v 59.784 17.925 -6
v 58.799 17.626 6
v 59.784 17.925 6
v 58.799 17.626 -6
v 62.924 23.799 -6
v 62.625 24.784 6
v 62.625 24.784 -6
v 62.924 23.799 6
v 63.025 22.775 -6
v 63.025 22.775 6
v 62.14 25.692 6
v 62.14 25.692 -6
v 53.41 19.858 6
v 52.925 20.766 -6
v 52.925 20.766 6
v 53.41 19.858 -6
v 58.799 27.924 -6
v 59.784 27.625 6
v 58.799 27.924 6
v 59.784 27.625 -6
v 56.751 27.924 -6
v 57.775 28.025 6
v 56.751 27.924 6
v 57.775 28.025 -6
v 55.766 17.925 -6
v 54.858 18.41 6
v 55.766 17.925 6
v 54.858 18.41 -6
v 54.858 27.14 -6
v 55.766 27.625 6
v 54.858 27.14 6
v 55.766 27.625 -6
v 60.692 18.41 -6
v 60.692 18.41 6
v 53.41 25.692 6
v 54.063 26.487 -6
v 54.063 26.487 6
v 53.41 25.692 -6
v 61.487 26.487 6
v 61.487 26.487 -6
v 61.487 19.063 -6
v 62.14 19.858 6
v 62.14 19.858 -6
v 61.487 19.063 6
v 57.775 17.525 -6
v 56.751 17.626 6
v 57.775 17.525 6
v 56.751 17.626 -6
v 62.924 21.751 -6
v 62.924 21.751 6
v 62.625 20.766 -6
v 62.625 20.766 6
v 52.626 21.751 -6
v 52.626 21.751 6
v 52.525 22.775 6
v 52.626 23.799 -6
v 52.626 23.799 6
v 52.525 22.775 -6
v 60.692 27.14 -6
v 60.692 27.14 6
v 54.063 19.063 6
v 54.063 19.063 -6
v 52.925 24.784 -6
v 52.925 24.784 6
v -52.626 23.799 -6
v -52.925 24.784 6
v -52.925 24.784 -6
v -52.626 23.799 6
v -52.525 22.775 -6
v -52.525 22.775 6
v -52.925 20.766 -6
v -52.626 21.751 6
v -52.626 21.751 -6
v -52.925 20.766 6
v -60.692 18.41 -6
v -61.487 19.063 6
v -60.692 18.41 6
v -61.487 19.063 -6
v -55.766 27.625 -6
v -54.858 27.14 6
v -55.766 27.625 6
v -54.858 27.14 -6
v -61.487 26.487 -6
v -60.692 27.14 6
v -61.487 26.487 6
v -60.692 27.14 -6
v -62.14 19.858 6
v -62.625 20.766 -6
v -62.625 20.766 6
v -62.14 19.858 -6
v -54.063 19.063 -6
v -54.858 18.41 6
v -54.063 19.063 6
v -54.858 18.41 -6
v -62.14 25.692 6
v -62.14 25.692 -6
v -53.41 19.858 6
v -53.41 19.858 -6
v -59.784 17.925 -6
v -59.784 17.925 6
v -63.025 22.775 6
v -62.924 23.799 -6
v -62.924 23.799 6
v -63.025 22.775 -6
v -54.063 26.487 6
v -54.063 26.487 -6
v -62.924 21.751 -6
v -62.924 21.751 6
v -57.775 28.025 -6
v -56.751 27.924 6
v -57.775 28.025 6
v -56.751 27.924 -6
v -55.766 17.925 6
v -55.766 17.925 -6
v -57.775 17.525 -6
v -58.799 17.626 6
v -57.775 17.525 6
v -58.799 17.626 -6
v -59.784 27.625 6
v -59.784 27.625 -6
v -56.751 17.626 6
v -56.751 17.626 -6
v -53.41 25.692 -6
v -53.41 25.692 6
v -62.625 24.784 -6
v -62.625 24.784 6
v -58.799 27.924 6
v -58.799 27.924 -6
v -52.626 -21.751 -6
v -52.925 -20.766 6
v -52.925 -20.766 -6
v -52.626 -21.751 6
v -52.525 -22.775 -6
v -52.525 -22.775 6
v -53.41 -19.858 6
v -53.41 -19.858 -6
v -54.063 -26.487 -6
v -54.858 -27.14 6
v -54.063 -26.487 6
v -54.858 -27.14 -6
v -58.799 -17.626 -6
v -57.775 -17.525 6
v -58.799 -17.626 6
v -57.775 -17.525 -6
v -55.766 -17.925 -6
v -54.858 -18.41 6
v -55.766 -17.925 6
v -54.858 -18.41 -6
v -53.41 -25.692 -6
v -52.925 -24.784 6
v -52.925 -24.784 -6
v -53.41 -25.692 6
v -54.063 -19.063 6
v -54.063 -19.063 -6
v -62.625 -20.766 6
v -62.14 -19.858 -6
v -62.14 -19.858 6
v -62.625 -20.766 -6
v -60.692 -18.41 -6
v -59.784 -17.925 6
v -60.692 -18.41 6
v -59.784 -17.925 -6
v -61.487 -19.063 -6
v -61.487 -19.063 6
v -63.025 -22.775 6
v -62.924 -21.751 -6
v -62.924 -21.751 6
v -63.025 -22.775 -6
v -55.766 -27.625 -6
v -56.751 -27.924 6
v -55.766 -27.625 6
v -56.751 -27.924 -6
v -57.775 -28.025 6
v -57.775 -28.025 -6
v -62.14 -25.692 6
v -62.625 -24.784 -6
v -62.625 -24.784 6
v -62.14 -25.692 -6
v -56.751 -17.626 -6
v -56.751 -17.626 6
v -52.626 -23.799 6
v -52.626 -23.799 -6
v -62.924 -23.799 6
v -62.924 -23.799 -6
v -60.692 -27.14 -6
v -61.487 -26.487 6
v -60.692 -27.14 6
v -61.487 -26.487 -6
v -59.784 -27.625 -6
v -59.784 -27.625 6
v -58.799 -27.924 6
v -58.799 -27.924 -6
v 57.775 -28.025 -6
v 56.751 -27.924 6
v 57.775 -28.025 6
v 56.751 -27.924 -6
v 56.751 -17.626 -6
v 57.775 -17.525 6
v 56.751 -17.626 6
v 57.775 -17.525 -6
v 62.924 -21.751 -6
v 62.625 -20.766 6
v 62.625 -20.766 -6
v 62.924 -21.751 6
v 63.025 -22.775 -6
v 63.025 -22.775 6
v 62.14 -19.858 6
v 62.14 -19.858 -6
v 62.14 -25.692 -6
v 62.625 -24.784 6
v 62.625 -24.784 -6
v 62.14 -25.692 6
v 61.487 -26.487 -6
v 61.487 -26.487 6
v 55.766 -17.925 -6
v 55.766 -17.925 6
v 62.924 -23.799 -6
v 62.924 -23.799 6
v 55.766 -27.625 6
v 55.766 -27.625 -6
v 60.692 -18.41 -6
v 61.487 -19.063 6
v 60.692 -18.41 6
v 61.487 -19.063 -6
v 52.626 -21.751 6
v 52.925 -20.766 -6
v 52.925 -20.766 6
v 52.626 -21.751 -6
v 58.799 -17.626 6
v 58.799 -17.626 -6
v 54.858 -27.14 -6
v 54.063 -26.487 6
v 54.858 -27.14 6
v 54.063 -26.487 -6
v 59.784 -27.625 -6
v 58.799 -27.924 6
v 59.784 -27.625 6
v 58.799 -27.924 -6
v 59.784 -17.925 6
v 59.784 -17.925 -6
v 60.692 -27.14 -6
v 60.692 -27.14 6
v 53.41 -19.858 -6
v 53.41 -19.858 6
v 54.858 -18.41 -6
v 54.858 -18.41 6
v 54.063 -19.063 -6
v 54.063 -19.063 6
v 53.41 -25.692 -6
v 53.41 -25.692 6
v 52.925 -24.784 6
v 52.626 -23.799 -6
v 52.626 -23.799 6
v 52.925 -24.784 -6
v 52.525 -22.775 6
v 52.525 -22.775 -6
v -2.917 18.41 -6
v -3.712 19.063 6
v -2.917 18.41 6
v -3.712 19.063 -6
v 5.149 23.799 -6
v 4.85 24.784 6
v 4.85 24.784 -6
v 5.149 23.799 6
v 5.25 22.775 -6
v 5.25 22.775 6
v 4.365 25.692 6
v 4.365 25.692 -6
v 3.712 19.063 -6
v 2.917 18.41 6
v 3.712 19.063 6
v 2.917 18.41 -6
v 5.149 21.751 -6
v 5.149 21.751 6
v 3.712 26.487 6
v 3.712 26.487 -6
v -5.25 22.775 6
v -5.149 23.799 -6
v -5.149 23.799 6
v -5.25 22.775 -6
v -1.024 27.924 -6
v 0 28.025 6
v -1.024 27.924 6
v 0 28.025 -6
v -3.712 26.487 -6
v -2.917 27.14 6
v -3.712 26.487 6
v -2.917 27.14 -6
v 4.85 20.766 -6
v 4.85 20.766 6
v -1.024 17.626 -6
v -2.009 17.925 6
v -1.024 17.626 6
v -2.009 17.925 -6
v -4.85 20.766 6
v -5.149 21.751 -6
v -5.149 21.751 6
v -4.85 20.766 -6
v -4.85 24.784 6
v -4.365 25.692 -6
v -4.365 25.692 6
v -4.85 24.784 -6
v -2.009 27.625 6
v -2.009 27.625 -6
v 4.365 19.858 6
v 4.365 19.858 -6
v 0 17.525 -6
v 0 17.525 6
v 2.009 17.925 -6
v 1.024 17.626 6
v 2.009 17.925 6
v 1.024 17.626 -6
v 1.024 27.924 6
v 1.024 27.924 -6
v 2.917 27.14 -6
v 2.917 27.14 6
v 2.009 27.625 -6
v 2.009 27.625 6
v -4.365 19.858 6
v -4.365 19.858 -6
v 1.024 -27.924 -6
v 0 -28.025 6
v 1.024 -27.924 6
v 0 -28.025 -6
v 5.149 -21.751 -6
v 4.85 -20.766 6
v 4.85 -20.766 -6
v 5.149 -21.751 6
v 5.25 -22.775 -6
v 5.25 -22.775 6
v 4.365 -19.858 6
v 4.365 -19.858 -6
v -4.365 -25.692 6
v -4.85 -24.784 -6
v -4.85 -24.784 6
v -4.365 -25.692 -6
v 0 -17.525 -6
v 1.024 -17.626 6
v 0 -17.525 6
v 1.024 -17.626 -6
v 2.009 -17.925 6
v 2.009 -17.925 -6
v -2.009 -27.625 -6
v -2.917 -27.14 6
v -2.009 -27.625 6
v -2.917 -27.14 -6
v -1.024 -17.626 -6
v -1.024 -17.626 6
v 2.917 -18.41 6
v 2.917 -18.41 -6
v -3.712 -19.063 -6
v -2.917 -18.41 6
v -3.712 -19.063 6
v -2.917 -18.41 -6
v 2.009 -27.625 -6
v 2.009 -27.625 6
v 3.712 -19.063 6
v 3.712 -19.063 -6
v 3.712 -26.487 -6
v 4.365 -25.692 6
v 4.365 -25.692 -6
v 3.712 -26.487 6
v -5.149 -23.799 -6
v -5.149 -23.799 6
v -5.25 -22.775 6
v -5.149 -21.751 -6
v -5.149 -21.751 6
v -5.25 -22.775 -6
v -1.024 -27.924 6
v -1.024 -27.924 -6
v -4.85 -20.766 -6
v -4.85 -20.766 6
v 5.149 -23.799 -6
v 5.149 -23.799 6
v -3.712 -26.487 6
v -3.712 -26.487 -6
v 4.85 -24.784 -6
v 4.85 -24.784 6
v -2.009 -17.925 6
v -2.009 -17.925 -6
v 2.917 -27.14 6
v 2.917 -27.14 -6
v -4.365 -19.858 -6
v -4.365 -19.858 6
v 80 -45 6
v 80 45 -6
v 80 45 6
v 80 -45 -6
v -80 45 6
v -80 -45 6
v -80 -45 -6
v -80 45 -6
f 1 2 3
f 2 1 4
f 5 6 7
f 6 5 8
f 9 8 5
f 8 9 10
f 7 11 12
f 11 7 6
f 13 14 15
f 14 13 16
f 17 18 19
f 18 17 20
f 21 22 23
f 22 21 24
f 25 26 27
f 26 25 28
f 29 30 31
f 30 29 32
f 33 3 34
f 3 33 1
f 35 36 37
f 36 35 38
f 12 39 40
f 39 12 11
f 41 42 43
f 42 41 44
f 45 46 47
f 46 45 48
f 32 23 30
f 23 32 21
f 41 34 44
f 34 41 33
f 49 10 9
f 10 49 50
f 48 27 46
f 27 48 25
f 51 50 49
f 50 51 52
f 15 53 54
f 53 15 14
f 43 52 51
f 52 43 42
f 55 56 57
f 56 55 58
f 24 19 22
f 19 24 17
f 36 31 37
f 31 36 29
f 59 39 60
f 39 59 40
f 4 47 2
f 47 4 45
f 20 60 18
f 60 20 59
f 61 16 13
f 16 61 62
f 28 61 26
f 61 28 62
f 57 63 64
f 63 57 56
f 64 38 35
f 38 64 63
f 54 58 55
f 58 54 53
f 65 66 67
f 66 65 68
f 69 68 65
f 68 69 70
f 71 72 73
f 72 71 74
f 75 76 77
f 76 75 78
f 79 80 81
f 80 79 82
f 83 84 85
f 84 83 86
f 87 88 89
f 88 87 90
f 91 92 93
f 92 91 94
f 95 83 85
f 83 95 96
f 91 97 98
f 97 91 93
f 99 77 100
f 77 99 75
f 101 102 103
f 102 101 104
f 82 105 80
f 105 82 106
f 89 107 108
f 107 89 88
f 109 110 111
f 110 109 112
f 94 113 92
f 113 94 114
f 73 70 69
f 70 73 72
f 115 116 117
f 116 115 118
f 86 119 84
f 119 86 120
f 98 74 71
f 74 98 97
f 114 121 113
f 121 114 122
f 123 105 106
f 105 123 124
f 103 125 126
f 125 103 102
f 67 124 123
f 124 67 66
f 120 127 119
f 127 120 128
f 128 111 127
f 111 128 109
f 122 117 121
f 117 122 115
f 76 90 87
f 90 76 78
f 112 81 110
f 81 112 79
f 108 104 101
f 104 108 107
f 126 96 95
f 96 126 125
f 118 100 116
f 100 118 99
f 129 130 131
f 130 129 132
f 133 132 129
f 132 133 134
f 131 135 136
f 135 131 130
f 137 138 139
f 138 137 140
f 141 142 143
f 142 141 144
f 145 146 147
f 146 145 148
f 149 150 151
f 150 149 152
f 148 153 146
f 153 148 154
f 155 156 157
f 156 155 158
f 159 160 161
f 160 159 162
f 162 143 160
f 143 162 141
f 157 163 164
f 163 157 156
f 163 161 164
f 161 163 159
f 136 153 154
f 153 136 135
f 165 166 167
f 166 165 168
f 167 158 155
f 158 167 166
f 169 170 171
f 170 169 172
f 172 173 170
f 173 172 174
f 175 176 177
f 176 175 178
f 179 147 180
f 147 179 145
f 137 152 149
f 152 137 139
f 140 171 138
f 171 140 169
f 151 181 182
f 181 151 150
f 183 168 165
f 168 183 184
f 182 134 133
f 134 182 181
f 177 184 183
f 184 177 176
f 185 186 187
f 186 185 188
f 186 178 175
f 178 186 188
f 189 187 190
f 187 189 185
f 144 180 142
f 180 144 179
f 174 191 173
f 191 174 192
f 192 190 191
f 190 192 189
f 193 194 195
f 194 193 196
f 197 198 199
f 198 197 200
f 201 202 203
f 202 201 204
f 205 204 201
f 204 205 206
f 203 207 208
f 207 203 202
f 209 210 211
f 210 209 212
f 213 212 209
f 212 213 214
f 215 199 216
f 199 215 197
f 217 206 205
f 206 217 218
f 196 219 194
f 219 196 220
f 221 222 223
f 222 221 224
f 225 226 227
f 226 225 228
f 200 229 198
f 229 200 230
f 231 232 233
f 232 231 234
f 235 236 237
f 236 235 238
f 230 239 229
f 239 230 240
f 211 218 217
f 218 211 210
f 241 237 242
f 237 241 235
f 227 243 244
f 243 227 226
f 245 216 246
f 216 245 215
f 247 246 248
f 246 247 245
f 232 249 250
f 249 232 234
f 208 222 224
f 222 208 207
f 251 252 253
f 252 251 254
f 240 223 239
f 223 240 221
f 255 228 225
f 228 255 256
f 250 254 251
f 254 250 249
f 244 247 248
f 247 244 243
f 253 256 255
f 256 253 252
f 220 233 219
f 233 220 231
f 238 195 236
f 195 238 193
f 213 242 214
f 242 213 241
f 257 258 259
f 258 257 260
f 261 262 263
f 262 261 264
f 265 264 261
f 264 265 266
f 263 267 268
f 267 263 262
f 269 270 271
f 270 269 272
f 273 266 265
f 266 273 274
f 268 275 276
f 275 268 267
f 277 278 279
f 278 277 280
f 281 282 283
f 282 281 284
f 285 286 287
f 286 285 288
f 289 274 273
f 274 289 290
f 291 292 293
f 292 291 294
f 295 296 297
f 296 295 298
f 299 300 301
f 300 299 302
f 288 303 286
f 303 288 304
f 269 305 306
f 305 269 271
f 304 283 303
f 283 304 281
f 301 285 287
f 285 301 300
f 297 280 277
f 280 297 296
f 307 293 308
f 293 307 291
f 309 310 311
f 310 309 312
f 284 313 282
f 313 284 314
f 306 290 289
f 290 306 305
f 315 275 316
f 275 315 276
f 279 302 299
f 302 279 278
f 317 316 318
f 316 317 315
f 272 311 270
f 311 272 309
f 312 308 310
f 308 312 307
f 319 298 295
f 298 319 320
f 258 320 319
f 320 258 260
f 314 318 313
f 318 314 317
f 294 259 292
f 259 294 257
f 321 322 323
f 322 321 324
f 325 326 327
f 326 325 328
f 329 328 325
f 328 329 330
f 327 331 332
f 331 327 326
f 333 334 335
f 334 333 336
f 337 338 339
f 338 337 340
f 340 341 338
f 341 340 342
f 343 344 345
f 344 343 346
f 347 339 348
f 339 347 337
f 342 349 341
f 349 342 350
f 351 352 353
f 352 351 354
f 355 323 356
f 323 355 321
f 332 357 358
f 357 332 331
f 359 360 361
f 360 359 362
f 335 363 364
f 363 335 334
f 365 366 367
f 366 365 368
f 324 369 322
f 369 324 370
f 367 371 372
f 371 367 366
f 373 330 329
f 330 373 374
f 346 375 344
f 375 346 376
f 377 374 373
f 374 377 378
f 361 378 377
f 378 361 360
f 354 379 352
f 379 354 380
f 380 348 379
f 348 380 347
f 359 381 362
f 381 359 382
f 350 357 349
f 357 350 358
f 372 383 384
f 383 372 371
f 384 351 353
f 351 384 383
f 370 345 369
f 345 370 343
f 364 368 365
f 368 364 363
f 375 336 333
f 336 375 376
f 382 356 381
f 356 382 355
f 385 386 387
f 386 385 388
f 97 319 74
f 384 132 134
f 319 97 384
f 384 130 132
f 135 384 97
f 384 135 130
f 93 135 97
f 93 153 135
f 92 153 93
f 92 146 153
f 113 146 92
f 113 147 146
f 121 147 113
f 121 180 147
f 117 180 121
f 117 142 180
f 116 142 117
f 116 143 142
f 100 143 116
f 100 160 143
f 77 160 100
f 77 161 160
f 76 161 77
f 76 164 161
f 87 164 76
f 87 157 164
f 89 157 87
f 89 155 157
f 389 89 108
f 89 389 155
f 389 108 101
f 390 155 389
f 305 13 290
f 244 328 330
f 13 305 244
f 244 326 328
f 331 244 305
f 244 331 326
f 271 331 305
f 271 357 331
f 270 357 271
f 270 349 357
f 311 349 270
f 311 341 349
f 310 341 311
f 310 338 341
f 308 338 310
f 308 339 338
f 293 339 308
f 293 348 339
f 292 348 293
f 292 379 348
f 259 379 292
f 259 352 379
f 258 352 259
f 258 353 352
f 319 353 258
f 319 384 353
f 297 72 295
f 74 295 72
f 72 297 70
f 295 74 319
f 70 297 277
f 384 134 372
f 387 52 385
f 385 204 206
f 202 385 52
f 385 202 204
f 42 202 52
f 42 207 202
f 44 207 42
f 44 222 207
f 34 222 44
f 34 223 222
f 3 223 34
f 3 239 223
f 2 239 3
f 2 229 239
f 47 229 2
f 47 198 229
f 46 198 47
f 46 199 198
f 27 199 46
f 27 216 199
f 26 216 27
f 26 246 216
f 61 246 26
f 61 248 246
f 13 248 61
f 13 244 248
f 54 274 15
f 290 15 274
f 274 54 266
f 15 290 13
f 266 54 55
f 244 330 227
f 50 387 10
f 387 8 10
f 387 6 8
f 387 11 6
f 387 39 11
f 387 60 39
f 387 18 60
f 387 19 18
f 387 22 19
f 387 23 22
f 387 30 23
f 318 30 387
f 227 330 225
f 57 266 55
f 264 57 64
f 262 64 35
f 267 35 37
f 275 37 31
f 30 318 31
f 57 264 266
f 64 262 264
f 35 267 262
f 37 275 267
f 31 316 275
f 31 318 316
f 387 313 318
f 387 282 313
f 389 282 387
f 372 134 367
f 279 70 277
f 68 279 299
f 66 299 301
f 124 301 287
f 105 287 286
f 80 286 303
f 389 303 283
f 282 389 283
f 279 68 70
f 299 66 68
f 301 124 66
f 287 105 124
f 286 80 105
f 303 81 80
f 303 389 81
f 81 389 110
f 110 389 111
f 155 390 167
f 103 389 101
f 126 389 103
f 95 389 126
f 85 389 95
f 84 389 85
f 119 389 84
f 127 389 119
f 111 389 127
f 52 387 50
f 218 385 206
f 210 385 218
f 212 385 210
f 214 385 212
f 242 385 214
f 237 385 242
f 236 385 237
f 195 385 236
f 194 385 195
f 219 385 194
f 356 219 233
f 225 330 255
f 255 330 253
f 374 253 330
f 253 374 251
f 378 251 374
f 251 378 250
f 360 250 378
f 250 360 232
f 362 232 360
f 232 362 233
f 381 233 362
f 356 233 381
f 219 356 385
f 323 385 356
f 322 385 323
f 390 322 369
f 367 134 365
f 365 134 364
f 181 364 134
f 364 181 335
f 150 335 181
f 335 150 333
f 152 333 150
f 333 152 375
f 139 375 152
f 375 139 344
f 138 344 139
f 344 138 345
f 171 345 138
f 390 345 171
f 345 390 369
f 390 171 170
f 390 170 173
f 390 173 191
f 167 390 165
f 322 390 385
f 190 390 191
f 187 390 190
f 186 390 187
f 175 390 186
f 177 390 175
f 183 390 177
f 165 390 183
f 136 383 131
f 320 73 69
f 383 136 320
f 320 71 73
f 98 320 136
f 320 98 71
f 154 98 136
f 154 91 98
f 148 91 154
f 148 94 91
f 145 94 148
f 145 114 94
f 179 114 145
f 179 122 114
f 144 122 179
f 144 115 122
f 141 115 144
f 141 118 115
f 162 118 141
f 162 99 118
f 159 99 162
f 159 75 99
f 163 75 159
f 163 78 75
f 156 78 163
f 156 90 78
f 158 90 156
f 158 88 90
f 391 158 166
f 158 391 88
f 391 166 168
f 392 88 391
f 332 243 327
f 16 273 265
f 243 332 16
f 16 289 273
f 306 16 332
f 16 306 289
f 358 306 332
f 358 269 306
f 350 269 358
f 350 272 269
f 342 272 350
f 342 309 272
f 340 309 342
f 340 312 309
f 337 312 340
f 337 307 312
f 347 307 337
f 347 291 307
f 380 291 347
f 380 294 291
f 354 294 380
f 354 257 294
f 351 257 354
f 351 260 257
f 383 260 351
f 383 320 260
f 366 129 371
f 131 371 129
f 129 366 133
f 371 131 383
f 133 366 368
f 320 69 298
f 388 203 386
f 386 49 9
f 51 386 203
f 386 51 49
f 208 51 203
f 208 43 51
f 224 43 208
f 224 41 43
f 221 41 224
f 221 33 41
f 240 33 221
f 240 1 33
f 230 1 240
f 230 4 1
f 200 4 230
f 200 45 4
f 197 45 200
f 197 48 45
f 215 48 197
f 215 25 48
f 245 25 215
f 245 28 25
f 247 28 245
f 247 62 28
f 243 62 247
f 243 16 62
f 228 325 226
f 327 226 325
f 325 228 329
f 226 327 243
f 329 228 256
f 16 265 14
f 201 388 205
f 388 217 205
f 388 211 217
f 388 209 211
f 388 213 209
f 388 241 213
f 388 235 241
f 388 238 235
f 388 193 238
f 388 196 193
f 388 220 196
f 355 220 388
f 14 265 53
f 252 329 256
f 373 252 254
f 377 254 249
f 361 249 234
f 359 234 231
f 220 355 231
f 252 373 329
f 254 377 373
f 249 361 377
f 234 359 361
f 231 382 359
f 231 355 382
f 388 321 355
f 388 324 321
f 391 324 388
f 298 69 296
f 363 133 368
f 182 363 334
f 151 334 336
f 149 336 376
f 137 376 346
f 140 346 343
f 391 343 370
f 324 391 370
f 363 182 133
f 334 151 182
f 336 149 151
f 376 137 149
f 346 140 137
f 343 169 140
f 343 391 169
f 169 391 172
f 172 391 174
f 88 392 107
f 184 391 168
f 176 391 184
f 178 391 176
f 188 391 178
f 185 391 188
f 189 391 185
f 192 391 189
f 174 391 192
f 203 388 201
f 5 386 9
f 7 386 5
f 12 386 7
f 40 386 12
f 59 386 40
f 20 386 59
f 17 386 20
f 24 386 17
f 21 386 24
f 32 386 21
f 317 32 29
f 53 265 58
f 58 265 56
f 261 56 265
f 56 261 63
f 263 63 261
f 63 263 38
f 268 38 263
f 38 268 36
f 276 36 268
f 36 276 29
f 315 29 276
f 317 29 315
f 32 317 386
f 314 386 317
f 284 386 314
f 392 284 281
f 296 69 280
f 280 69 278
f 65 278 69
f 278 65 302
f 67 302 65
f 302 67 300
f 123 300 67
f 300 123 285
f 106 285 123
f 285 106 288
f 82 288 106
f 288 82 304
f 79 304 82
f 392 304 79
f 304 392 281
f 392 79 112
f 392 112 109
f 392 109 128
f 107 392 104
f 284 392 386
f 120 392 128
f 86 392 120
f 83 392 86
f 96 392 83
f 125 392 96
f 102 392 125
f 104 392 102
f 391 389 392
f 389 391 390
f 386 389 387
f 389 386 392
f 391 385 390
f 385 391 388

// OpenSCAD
$fn = 32;

// ----------------------------------------------------------------------
// Corner plate 160 x 90 x 12
// 6 holes, centres taken from the edge offset
// ----------------------------------------------------------------------

// --- parameters (mm) ---
plate = [160, 90, 12];  // overall size (x, y, z)
holes = 6;              // number of holes the drawing asks for
hole_d = 10.5;          // hole diameter
edge = 22.225;          // hole centre offset from the plate edge

// --- derived feature positions (mm) ---
corner_x = plate[0] / 2 - edge;  // = 57.77   corner hole X
corner_y = plate[1] / 2 - edge;  // = 22.77   corner hole Y
feature_centers = [
  [corner_x, corner_y],
  [-corner_x, corner_y],
  [-corner_x, -corner_y],
  [corner_x, -corner_y],
  [0, corner_y],
  [0, -corner_y]
];   // hole centres the loop below drills

// plate outline, every hole drilled through with the same cutters
difference() {
  cube(plate, center = true);
  for (centre = feature_centers)
    translate([centre[0], centre[1], 0])
      cylinder(d = hole_d, h = plate[2] + 2, center = true);
}
